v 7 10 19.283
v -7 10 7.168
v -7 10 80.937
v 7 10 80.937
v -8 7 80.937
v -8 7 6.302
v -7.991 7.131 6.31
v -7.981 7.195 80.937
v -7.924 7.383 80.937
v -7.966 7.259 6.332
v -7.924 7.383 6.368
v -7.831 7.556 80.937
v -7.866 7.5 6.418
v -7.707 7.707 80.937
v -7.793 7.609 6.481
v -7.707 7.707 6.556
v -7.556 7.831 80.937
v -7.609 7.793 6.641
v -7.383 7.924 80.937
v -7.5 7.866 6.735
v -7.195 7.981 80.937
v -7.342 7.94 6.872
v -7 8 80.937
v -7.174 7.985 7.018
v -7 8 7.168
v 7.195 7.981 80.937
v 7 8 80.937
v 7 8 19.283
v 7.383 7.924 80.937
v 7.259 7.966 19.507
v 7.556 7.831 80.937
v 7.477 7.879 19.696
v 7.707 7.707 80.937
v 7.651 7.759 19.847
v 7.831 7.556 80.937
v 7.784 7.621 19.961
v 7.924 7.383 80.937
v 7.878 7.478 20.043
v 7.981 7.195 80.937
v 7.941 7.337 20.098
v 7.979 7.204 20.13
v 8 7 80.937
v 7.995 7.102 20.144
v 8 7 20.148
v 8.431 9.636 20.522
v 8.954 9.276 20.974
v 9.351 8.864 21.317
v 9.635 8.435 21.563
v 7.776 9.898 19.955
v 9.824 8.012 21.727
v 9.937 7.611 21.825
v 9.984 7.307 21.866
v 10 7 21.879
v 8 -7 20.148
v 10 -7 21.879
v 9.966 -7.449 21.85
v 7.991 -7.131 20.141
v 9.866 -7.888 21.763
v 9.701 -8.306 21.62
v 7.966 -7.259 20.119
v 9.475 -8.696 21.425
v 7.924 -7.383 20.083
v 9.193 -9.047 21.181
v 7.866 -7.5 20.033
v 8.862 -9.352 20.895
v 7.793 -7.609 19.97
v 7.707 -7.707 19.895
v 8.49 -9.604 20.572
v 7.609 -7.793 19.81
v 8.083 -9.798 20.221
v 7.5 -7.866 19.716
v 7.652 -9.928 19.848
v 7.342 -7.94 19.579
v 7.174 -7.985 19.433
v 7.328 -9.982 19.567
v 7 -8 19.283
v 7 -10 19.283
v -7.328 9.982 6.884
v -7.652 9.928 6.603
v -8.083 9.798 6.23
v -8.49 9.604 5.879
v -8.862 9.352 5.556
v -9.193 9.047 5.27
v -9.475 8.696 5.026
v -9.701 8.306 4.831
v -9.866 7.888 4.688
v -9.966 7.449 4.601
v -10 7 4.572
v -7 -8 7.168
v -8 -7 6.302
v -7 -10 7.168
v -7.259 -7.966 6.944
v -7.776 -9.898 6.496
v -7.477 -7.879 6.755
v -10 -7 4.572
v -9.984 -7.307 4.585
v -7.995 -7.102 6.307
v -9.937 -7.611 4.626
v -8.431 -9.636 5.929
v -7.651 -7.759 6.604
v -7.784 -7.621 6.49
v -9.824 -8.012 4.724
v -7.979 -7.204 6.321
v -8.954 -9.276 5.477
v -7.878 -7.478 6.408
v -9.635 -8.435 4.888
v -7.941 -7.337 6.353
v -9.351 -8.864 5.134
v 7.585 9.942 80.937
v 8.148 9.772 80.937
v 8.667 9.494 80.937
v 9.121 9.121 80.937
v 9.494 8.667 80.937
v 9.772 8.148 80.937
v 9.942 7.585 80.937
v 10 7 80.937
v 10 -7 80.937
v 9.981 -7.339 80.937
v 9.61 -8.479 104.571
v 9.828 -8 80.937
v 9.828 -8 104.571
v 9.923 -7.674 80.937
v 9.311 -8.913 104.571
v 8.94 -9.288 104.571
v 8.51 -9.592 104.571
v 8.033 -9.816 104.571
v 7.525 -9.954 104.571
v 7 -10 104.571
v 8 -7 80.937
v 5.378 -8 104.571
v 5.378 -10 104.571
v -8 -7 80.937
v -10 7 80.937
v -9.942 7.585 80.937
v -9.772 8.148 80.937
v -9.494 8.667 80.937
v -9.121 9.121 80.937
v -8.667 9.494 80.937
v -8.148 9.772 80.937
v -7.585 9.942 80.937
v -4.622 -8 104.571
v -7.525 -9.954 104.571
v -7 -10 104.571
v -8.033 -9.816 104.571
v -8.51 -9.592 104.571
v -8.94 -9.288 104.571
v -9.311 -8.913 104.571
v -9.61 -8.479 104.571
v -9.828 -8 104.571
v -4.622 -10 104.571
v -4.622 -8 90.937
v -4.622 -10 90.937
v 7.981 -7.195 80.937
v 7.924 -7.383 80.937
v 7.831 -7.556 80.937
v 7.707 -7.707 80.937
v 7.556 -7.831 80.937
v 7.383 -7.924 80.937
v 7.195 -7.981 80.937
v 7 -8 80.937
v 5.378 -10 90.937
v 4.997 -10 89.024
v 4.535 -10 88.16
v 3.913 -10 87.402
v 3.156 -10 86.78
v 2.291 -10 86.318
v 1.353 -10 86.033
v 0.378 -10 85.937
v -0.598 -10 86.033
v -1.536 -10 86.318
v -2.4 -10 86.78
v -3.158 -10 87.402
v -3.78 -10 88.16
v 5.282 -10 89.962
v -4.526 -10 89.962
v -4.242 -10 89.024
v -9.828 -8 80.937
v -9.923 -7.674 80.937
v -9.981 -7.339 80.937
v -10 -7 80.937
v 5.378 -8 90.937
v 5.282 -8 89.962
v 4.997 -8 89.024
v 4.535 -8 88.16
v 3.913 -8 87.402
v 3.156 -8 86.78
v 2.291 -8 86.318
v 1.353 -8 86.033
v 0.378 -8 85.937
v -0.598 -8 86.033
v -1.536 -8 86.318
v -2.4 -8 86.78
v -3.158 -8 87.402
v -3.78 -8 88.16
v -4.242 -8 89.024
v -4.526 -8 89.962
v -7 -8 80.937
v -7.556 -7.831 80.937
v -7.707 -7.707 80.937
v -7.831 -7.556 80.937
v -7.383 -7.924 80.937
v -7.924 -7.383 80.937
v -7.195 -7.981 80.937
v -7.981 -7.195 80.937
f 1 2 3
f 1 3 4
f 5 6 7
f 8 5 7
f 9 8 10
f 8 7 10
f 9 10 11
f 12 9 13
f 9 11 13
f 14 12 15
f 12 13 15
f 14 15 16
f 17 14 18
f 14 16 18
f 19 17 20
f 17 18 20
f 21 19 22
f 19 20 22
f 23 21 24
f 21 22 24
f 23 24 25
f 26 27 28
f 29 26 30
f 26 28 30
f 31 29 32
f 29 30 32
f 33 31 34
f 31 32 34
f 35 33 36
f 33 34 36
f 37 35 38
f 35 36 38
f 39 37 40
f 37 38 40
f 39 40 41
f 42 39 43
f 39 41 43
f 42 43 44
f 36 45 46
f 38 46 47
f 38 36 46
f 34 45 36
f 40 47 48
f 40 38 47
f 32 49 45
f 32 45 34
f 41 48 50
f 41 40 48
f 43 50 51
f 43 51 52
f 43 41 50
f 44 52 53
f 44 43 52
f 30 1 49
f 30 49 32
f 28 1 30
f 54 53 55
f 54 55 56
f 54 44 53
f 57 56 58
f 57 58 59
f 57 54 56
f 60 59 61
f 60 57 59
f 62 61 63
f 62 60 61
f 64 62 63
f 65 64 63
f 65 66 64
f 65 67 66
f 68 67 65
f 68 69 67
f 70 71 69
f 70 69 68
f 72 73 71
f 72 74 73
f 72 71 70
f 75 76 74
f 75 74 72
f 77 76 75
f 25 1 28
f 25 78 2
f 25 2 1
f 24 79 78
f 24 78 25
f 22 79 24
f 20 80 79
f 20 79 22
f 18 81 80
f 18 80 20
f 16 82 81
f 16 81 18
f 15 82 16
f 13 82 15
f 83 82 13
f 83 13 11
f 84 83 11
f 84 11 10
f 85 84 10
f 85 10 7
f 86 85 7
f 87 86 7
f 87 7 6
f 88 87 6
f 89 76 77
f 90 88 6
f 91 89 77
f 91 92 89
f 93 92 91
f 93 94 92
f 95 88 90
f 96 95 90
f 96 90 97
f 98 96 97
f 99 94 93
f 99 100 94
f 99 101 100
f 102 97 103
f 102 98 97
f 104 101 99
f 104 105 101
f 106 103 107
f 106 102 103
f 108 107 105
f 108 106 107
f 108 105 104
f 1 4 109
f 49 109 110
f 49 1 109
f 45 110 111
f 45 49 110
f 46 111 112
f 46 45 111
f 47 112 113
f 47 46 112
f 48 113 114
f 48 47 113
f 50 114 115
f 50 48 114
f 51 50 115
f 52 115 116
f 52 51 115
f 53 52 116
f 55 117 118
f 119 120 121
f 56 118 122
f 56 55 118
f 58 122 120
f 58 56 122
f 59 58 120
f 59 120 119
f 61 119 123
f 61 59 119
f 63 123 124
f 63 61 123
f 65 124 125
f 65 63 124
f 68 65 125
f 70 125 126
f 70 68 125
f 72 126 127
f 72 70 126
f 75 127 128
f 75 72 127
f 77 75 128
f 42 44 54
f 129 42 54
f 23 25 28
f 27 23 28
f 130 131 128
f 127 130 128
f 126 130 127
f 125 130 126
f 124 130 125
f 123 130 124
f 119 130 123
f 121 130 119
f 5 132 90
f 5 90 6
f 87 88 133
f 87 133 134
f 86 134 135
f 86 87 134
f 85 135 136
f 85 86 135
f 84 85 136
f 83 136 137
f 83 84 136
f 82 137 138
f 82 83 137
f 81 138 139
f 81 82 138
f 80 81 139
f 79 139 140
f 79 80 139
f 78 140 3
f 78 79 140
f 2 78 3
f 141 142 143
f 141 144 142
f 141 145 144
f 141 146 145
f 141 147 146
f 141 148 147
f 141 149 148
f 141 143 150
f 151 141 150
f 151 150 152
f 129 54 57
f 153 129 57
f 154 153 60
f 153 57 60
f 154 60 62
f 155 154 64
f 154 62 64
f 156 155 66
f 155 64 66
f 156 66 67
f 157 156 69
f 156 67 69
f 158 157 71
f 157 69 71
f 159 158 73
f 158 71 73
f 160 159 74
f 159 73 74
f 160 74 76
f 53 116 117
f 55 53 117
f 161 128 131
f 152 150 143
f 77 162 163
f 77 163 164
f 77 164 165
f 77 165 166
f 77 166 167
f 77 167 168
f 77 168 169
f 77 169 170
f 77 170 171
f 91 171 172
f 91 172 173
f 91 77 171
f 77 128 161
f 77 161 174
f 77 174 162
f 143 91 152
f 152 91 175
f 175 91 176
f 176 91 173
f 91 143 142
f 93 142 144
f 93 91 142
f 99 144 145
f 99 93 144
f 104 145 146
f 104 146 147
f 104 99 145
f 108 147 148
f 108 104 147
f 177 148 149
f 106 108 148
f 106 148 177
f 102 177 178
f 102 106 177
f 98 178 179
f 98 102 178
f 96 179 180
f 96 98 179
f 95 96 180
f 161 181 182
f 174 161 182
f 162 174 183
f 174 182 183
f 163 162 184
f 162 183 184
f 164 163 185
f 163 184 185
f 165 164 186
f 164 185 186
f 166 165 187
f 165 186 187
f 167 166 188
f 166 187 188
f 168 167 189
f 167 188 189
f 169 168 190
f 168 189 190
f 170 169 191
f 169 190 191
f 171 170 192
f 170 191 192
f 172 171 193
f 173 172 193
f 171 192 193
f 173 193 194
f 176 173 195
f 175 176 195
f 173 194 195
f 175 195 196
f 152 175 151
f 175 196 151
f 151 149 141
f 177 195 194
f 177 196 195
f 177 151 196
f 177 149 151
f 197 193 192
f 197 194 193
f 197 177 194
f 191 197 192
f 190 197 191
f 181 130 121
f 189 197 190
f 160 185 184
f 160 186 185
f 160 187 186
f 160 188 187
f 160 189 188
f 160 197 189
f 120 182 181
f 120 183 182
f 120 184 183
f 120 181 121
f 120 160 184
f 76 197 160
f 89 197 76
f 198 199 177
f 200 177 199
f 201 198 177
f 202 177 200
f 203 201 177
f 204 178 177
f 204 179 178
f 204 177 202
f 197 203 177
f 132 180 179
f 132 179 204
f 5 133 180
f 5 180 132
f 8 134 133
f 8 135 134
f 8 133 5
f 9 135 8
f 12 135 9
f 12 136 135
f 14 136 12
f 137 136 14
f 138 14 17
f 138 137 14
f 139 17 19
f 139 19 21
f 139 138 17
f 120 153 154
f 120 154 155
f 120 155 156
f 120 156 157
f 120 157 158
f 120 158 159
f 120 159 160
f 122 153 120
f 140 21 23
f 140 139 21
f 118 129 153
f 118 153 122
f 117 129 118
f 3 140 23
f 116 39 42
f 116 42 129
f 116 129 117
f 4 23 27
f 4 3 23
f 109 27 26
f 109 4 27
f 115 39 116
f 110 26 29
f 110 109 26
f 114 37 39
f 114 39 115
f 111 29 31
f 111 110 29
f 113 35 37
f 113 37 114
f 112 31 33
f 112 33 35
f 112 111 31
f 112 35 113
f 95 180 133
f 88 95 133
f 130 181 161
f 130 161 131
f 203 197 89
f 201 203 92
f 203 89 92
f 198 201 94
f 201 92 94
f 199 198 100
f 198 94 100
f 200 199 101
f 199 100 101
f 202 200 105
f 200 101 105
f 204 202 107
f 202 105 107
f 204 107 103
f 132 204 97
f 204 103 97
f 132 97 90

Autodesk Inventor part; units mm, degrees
ref_plane "Start Plane" through (0, 0, 4.5707) normal (0, 0, 1) x (1, 0, 0)
ref_plane "End Plane" through (0, 0, 110) normal (0, 0, 1) x (1, 0, 0)
sketch "Sketch" plane through (0, 0, 0) normal (0, 0, 1) x (1, 0, 0)
  line L0 (-10, -7) -> (-10, 7)
  line L1 (-7, 10) -> (7, 10)
  line L2 (10, 7) -> (10, -7)
  line L3 (7, -10) -> (-7, -10)
  arc A0 (-10, -7) -> (-7, -10) centre (-7, -7) ccw
  arc A1 (-7, 10) -> (-10, 7) centre (-7, 7) ccw
  arc A2 (10, 7) -> (7, 10) centre (7, 7) ccw
  arc A3 (7, -10) -> (10, -7) centre (7, -7) ccw
  arc A4 (-7, 8) -> (-8, 7) centre (-7, 7) ccw
  line L4 (-7, 8) -> (7, 8)
  arc A5 (8, 7) -> (7, 8) centre (7, 7) ccw
  line L5 (8, 7) -> (8, -7)
  arc A6 (7, -8) -> (8, -7) centre (7, -7) ccw
  line L6 (7, -8) -> (-7, -8)
  arc A7 (-8, -7) -> (-7, -8) centre (-7, -7) ccw
  line L7 (-8, -7) -> (-8, 7)
  line L8 (0, 14.8698) -> (0, -14.8698) construction
  line L9 (-14.8698, 0) -> (14.8698, 0) construction
  dimension "d7" = 3
  dimension "d10" = 20
  dimension "d11" = 20
  dimension "d12" = 2
  dimension "d15" = 10
  dimension "d16" = 10
extrude "Body" add sketch "Sketch" along normal up to surface (105.4293 mm away) from surface at 4.5707
sketch "Sketch3" plane through (0, 0, 0) normal (0, 0, 1) x (1, 0, 0)
  line L0 (0, 0) -> (10, 0)
ref_plane "Work Plane3" through (0, 0, 0) normal (0, -1, 0) x (1, 0, 0)
sketch "Sketch4" plane through (0, 0, 0) normal (0, -1, 0) x (1, 0, 0)
  line L0 (-2, 4.5707) -> (12, 4.5707)
  line L1 (-2, 110) -> (12, 110)
  dimension "d18" = 105.4293
ref_plane "Work Plane4" through (163.4562, 7, 154.6771) normal (0.6544, 0, -0.7562) x (-0.7562, 0, -0.6544)
split "Split1" plane through (163.4562, 7, 154.6771) removes the side toward (0.6544, 0, -0.7562)
sketch "Sketch5" plane through (-7, 10, 110) normal (0, 1, 0) x (1, 0, 0)
  line L0 (-3, 0) -> (-3, 105.4293)
  line L1 (4805.2907, 8171.9937) -> (4797.7312, 8176.4206)
  line L2 (-3, 29.0626) -> (17, 29.0626)
  line L3 (-3, 5.4293) -> (17, 5.4293)
  circle A0 centre (7.3777, 19.0626) radius 5
  circle A1 centre (7.3777, 19.0626) radius 5 construction
  line L4 (4797.7312, 8176.4206) -> (4800.2551, 8213.114)
  line L5 (12.3777, 19.0626) -> (12.3777, -7767.3118)
  line L6 (-3, 105.4293) -> (0, 102.8331) projected
  line L7 (14, 90.7177) -> (17, 88.1216) projected
  line L8 (0, 0) -> (14, 0) projected
  arc A2 (12.3777, 11.5793) -> (2.3777, 11.5793) centre (7.3777, 19.0626) ccw
  line L9 (7.3777, 19.0626) -> (7.3777, 0) construction
  line L10 (7.3777, 19.0626) -> (7.3777, 29.6702) construction
  line L11 (2.3777, 0) -> (2.3777, 19.0626)
  line L12 (17, 88.1216) -> (17, 0) projected
  line L13 (-3, 0) -> (17, 0)
  line L14 (0, 0) -> (-3, 0) projected
  point P0 (7, 110)
  point P1 (7.3777, 28.0626)
  point P2 (2.3777, 5.4293)
  point P3 (12.3777, 5.4293)
  point P4 (12.3777, 0)
  point P5 (12.3777, 11.5793)
  point P6 (2.3777, 11.5793)
  point P7 (12.3777, 19.0626)
  point P8 (17, 60.7933)
  dimension "d23" = 10
  dimension "d27" = 18
  dimension "d28" = 1
  dimension "d33" = 100
extrude "Extrusion2" cut sketch "Sketch5" against normal up to surface (18 mm away) contours L0 L3 L11 L8 L13 | L0 L2 L12 L3 L5 A2 L11 | L11 A0 L5 L3 | L3 L12 L13 L8 L5 | A2 L5 A0 L11
extrude "Extrusion3" cut sketch "Sketch5" against normal through all contours L0 L3 L11 L8 L13 | L11 A0 L5 L3 | L3 L5 L8 L11 | L3 L12 L13 L8 L5 | A0
equation "\"d7\" = G_IR"
equation "\"d10\" = G_H"
equation "\"d11\" = G_W"
equation "\"d12\" = G_T"
equation "\"d15\" = 0.5 * d10"
equation "\"d16\" = 0.5 * d11"
equation "\"d3\" = G_L"
equation "\"G_W\" = 20"
equation "\"G_H\" = 20"
equation "\"G_T\" = 2"
equation "\"G_IR\" = 3"
equation "\"G_L\" = d18"
equation "\"G_OFFSET_START\" = -4.57072"
equation "\"G_OFFSET_END\" = 0"
equation "\"d13\" = -G_OFFSET_START"
properties part number "ISO 12633-2 - 20x20x2 - 105,43" material "Steel, Mild"
